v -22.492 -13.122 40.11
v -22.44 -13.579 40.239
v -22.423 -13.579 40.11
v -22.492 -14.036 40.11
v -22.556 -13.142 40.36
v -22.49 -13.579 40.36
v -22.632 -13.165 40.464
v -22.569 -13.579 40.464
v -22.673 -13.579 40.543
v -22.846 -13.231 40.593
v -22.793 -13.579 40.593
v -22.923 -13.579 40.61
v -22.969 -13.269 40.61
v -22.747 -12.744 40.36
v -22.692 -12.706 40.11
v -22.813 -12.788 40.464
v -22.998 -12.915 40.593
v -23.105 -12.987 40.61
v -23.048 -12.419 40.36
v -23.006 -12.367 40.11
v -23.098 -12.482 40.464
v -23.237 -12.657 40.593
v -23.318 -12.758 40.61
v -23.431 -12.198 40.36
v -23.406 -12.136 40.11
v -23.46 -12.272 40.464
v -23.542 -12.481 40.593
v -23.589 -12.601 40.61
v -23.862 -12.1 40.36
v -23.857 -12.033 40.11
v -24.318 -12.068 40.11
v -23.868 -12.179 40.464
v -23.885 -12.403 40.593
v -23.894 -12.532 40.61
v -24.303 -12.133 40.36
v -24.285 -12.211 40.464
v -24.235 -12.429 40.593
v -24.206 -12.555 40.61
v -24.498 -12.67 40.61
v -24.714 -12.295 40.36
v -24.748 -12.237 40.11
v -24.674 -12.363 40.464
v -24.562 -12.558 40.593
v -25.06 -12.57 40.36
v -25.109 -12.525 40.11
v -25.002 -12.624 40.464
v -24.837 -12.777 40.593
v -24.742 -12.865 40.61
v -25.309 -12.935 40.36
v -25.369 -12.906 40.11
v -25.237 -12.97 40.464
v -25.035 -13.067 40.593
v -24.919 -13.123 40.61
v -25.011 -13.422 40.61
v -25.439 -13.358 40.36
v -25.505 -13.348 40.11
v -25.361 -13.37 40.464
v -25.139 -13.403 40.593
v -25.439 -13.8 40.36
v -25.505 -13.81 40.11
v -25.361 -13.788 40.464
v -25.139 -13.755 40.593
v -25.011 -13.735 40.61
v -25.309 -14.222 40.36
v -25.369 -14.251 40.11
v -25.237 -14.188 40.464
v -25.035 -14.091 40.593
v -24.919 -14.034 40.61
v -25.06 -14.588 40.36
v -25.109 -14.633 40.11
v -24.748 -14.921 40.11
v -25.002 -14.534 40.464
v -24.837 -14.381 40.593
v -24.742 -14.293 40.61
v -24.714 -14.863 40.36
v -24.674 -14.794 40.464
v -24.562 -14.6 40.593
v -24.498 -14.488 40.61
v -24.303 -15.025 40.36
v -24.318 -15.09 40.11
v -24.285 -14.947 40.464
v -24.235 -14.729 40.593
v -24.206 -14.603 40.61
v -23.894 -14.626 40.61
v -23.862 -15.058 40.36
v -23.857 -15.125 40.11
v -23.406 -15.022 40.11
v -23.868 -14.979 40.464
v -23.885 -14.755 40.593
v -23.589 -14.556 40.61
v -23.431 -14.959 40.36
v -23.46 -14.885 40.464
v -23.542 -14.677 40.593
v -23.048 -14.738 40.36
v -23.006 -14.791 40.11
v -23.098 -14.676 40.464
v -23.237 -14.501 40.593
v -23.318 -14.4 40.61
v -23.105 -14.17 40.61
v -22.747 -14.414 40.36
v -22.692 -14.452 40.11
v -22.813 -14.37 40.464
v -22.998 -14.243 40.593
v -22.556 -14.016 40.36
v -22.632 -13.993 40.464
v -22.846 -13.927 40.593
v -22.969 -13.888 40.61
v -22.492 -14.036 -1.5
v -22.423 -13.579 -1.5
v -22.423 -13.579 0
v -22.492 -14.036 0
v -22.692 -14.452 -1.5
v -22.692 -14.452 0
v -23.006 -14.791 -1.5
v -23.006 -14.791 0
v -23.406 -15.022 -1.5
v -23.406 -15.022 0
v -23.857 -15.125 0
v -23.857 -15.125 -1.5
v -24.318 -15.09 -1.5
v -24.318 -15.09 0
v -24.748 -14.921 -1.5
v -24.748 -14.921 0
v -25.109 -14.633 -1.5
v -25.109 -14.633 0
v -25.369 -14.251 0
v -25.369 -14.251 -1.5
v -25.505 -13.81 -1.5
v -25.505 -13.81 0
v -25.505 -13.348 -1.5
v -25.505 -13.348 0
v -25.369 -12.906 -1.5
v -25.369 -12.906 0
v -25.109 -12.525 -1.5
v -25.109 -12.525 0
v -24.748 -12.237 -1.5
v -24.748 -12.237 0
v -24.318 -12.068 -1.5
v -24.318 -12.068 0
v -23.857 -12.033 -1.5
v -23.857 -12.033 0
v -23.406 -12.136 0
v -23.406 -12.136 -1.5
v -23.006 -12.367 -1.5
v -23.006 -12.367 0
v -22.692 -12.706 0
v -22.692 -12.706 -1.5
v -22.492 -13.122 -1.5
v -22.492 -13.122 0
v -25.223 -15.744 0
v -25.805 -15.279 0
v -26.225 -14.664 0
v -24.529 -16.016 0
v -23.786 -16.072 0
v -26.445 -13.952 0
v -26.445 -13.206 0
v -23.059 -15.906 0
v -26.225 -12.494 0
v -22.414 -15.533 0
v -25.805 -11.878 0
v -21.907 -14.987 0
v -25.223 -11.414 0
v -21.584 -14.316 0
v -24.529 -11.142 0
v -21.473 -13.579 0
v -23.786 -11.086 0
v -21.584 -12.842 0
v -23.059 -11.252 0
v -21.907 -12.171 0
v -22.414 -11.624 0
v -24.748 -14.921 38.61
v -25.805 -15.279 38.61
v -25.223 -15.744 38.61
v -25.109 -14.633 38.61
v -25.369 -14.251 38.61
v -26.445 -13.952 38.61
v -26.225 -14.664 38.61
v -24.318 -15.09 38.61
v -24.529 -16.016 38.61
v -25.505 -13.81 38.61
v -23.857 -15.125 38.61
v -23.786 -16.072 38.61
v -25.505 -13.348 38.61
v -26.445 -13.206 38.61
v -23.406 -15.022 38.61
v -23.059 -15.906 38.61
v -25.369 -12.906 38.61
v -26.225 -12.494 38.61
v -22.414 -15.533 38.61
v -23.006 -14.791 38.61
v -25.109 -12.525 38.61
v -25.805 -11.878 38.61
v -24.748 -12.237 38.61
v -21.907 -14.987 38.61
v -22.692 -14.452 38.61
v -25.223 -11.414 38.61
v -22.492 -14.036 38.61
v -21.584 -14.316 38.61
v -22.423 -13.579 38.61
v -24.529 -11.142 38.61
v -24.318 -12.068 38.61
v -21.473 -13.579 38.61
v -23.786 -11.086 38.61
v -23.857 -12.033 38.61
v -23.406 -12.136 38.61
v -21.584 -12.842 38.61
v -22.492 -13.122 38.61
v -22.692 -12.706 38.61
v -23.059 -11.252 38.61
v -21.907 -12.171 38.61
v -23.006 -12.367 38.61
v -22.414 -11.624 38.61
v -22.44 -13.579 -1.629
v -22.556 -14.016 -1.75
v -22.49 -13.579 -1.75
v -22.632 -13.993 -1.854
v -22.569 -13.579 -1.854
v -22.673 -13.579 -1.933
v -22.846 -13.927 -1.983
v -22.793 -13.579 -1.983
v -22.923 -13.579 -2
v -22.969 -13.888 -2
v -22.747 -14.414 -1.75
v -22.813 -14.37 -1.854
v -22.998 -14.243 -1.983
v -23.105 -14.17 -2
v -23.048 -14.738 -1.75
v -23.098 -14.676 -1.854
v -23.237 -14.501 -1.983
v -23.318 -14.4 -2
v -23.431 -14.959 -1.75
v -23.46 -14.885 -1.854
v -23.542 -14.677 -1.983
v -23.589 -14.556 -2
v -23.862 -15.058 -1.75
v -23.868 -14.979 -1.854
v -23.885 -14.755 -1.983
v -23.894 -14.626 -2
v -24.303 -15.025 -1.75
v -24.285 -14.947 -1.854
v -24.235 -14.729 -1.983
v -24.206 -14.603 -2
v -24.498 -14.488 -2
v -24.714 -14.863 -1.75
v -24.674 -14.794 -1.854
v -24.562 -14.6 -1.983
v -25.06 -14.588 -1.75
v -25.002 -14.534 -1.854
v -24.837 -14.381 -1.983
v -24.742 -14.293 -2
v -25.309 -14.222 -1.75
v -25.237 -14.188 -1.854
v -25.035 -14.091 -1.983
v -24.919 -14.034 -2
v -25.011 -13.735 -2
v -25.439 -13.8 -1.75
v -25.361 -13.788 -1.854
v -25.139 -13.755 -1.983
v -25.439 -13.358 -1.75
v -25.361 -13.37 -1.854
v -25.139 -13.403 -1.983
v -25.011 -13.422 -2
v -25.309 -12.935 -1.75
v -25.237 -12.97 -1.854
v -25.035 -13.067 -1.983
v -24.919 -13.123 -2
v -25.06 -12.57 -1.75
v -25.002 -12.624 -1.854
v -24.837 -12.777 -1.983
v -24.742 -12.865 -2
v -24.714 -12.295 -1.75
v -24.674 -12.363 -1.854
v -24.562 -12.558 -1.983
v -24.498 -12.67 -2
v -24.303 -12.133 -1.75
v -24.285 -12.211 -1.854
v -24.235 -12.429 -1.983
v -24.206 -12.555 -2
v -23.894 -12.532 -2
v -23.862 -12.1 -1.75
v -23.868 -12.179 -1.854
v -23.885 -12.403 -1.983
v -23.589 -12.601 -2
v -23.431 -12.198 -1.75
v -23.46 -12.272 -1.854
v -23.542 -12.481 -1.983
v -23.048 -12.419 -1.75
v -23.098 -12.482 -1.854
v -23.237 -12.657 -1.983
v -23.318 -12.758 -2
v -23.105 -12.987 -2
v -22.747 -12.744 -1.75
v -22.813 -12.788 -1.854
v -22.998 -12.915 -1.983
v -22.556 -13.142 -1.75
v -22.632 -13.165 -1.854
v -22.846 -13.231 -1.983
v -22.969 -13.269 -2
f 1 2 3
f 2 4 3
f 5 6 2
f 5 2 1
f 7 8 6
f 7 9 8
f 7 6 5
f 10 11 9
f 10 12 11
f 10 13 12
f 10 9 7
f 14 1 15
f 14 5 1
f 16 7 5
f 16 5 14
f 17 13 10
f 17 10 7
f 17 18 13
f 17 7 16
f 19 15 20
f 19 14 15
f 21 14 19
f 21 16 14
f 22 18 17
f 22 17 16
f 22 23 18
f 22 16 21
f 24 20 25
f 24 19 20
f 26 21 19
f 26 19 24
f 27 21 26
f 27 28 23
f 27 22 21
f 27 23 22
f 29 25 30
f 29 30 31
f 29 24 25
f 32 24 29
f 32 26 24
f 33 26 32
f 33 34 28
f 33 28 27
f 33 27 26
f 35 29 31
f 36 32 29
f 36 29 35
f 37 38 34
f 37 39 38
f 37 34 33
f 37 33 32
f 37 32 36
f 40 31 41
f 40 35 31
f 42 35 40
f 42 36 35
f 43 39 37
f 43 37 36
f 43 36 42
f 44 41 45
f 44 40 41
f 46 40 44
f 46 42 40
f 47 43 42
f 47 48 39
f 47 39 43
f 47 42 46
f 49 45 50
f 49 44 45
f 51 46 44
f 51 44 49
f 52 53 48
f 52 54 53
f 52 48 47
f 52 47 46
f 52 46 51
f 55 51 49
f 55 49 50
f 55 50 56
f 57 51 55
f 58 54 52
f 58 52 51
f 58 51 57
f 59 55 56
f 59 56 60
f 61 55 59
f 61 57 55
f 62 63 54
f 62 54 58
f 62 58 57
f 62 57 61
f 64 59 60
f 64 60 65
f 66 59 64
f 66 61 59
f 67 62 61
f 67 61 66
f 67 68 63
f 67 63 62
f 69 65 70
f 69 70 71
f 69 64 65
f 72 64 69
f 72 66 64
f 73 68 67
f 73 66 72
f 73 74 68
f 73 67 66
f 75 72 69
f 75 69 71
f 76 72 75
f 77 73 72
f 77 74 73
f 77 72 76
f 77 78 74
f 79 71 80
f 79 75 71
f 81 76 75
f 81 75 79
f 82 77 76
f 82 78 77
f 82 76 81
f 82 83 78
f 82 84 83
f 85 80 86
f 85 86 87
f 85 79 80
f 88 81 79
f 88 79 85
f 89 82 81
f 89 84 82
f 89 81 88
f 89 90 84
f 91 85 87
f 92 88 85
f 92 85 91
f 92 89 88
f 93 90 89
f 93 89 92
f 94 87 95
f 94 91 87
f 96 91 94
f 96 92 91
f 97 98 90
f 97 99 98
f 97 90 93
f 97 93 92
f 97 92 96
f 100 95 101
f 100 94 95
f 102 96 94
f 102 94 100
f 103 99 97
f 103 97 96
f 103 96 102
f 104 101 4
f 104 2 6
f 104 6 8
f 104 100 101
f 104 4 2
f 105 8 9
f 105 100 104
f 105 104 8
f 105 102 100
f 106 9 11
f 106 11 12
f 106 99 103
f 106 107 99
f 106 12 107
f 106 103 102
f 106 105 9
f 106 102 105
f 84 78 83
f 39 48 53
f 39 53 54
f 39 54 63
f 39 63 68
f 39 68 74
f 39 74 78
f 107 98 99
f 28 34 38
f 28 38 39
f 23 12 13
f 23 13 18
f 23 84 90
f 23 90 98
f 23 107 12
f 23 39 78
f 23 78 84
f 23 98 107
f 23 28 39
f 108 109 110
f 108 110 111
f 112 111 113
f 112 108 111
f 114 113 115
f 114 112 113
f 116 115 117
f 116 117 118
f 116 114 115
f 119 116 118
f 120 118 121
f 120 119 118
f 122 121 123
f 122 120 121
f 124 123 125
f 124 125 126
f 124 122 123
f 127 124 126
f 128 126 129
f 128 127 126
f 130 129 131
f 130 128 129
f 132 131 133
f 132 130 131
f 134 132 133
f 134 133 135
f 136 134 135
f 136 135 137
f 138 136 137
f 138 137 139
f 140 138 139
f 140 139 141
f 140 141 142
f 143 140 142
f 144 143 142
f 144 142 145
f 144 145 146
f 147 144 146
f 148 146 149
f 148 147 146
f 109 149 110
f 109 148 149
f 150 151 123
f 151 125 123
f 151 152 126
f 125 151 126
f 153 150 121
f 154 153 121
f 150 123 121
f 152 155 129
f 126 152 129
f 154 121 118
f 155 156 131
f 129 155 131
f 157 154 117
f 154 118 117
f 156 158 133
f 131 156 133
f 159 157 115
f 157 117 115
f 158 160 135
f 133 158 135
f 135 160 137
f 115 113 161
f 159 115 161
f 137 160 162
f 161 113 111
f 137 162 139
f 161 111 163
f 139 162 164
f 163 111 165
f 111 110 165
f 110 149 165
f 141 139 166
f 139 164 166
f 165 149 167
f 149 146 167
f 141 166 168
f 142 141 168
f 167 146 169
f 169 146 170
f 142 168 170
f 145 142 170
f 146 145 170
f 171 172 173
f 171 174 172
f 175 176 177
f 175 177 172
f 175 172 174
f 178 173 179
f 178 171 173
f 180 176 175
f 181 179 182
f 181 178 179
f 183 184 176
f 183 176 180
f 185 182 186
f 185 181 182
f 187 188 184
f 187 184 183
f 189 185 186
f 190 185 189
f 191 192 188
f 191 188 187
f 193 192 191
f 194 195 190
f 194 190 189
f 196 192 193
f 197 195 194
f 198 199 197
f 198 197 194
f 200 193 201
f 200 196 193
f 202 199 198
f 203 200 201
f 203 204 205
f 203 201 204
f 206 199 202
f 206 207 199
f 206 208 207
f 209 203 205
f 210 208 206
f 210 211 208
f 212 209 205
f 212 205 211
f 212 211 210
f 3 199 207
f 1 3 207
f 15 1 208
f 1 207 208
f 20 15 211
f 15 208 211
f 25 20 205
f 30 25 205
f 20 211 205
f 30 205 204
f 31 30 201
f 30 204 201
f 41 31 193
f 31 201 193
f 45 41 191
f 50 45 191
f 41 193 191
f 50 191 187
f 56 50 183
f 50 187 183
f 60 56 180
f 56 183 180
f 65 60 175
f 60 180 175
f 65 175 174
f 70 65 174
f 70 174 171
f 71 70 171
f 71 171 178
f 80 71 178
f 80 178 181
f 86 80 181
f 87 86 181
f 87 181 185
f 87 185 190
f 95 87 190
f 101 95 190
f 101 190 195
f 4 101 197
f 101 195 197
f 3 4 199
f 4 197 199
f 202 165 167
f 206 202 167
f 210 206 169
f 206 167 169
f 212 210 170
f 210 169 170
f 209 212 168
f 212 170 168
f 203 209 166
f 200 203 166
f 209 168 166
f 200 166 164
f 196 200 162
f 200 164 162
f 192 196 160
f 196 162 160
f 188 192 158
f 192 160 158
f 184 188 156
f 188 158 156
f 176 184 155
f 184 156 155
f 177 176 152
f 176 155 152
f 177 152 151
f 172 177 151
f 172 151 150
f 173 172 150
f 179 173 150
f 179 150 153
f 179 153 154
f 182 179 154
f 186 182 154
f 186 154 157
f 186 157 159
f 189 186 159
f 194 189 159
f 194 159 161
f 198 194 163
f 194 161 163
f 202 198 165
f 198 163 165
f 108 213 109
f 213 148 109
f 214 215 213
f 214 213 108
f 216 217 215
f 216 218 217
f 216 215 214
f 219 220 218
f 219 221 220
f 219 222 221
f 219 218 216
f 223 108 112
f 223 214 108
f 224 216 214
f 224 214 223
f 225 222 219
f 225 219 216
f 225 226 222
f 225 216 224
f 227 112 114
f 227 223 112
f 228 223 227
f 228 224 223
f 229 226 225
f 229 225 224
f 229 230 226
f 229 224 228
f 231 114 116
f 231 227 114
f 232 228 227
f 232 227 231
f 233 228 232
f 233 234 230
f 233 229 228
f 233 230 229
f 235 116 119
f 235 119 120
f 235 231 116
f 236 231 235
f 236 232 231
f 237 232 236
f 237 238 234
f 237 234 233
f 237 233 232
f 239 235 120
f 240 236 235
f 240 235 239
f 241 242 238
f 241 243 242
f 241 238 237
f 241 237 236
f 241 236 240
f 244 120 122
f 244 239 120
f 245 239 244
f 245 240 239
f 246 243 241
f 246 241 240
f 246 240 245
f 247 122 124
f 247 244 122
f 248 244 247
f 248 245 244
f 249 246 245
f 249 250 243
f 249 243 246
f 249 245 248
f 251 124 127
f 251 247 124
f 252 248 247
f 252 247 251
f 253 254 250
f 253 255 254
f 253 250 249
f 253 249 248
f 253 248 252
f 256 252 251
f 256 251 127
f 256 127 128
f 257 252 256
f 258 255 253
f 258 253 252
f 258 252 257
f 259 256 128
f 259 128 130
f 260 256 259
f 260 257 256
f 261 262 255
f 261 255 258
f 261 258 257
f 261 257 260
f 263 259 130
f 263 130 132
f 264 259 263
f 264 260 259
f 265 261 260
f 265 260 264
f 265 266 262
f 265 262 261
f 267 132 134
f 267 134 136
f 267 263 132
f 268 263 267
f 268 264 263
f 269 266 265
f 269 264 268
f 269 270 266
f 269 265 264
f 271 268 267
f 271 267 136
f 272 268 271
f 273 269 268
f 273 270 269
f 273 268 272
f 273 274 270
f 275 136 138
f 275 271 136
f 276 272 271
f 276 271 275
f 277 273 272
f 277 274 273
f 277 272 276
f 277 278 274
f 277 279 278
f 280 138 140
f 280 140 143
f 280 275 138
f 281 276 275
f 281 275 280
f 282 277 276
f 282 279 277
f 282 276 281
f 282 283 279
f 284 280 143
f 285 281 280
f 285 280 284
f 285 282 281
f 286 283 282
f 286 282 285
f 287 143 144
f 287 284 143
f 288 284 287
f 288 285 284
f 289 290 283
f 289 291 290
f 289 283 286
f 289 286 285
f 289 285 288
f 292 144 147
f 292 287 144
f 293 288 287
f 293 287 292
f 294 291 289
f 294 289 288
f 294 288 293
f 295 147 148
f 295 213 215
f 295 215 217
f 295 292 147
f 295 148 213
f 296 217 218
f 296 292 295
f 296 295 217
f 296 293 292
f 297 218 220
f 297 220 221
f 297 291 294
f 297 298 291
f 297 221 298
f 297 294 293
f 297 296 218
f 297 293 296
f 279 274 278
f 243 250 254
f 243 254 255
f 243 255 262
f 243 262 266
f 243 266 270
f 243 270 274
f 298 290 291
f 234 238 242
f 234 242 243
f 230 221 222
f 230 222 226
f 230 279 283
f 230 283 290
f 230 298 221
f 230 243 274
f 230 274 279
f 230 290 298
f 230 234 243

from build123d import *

# Parameters (mm, degrees)
SKETCH1_R           = 2.5
BOSS_EXTRUDE1_DEPTH = 38.61
SKETCH2_R           = 1.55
BOSS_EXTRUDE2_DEPTH = 2
FILLET1_R           = 0.5
BOSS_EXTRUDE3_START = 2
SKETCH3_R           = 1.55
BOSS_EXTRUDE3_DEPTH = 2
FILLET2_R           = 0.5


with BuildPart() as part:
    # Sketch1 → Boss-Extrude1 (new body)
    with BuildSketch(Plane.XY):
        with Locations((-23.972717512, -13.578911998)):
            Circle(SKETCH1_R)
    extrude(amount=BOSS_EXTRUDE1_DEPTH)

    # Sketch2 → Boss-Extrude2 (add)
    with BuildSketch(Plane.XY.offset(38.61)):
        with Locations((-23.972717512, -13.578911998)):
            Circle(SKETCH2_R)
    extrude(amount=BOSS_EXTRUDE2_DEPTH)

    # Fillet1
    fillet1_edges = [part.edges().sort_by_distance(p)[0] for p in [
        (-25.522717512, -13.578911998, 40.61),
    ]]
    fillet(fillet1_edges, radius=FILLET1_R)

    # Sketch3 → Boss-Extrude3 (add)
    with BuildSketch(Plane(origin=(0, 0, 0), x_dir=(-1, 0, 0), z_dir=(0, 0, -1)).offset(BOSS_EXTRUDE3_START)):
        with Locations(Location((23.972717512, -13.578911998, 0), (0, 0, 180))):
            Circle(SKETCH3_R)
    extrude(amount=-BOSS_EXTRUDE3_DEPTH)

    # Fillet2
    fillet2_edges = [part.edges().sort_by_distance(p)[0] for p in [
        (-25.522717512, -13.578911998, -2),
    ]]
    fillet(fillet2_edges, radius=FILLET2_R)


solid = part.part
